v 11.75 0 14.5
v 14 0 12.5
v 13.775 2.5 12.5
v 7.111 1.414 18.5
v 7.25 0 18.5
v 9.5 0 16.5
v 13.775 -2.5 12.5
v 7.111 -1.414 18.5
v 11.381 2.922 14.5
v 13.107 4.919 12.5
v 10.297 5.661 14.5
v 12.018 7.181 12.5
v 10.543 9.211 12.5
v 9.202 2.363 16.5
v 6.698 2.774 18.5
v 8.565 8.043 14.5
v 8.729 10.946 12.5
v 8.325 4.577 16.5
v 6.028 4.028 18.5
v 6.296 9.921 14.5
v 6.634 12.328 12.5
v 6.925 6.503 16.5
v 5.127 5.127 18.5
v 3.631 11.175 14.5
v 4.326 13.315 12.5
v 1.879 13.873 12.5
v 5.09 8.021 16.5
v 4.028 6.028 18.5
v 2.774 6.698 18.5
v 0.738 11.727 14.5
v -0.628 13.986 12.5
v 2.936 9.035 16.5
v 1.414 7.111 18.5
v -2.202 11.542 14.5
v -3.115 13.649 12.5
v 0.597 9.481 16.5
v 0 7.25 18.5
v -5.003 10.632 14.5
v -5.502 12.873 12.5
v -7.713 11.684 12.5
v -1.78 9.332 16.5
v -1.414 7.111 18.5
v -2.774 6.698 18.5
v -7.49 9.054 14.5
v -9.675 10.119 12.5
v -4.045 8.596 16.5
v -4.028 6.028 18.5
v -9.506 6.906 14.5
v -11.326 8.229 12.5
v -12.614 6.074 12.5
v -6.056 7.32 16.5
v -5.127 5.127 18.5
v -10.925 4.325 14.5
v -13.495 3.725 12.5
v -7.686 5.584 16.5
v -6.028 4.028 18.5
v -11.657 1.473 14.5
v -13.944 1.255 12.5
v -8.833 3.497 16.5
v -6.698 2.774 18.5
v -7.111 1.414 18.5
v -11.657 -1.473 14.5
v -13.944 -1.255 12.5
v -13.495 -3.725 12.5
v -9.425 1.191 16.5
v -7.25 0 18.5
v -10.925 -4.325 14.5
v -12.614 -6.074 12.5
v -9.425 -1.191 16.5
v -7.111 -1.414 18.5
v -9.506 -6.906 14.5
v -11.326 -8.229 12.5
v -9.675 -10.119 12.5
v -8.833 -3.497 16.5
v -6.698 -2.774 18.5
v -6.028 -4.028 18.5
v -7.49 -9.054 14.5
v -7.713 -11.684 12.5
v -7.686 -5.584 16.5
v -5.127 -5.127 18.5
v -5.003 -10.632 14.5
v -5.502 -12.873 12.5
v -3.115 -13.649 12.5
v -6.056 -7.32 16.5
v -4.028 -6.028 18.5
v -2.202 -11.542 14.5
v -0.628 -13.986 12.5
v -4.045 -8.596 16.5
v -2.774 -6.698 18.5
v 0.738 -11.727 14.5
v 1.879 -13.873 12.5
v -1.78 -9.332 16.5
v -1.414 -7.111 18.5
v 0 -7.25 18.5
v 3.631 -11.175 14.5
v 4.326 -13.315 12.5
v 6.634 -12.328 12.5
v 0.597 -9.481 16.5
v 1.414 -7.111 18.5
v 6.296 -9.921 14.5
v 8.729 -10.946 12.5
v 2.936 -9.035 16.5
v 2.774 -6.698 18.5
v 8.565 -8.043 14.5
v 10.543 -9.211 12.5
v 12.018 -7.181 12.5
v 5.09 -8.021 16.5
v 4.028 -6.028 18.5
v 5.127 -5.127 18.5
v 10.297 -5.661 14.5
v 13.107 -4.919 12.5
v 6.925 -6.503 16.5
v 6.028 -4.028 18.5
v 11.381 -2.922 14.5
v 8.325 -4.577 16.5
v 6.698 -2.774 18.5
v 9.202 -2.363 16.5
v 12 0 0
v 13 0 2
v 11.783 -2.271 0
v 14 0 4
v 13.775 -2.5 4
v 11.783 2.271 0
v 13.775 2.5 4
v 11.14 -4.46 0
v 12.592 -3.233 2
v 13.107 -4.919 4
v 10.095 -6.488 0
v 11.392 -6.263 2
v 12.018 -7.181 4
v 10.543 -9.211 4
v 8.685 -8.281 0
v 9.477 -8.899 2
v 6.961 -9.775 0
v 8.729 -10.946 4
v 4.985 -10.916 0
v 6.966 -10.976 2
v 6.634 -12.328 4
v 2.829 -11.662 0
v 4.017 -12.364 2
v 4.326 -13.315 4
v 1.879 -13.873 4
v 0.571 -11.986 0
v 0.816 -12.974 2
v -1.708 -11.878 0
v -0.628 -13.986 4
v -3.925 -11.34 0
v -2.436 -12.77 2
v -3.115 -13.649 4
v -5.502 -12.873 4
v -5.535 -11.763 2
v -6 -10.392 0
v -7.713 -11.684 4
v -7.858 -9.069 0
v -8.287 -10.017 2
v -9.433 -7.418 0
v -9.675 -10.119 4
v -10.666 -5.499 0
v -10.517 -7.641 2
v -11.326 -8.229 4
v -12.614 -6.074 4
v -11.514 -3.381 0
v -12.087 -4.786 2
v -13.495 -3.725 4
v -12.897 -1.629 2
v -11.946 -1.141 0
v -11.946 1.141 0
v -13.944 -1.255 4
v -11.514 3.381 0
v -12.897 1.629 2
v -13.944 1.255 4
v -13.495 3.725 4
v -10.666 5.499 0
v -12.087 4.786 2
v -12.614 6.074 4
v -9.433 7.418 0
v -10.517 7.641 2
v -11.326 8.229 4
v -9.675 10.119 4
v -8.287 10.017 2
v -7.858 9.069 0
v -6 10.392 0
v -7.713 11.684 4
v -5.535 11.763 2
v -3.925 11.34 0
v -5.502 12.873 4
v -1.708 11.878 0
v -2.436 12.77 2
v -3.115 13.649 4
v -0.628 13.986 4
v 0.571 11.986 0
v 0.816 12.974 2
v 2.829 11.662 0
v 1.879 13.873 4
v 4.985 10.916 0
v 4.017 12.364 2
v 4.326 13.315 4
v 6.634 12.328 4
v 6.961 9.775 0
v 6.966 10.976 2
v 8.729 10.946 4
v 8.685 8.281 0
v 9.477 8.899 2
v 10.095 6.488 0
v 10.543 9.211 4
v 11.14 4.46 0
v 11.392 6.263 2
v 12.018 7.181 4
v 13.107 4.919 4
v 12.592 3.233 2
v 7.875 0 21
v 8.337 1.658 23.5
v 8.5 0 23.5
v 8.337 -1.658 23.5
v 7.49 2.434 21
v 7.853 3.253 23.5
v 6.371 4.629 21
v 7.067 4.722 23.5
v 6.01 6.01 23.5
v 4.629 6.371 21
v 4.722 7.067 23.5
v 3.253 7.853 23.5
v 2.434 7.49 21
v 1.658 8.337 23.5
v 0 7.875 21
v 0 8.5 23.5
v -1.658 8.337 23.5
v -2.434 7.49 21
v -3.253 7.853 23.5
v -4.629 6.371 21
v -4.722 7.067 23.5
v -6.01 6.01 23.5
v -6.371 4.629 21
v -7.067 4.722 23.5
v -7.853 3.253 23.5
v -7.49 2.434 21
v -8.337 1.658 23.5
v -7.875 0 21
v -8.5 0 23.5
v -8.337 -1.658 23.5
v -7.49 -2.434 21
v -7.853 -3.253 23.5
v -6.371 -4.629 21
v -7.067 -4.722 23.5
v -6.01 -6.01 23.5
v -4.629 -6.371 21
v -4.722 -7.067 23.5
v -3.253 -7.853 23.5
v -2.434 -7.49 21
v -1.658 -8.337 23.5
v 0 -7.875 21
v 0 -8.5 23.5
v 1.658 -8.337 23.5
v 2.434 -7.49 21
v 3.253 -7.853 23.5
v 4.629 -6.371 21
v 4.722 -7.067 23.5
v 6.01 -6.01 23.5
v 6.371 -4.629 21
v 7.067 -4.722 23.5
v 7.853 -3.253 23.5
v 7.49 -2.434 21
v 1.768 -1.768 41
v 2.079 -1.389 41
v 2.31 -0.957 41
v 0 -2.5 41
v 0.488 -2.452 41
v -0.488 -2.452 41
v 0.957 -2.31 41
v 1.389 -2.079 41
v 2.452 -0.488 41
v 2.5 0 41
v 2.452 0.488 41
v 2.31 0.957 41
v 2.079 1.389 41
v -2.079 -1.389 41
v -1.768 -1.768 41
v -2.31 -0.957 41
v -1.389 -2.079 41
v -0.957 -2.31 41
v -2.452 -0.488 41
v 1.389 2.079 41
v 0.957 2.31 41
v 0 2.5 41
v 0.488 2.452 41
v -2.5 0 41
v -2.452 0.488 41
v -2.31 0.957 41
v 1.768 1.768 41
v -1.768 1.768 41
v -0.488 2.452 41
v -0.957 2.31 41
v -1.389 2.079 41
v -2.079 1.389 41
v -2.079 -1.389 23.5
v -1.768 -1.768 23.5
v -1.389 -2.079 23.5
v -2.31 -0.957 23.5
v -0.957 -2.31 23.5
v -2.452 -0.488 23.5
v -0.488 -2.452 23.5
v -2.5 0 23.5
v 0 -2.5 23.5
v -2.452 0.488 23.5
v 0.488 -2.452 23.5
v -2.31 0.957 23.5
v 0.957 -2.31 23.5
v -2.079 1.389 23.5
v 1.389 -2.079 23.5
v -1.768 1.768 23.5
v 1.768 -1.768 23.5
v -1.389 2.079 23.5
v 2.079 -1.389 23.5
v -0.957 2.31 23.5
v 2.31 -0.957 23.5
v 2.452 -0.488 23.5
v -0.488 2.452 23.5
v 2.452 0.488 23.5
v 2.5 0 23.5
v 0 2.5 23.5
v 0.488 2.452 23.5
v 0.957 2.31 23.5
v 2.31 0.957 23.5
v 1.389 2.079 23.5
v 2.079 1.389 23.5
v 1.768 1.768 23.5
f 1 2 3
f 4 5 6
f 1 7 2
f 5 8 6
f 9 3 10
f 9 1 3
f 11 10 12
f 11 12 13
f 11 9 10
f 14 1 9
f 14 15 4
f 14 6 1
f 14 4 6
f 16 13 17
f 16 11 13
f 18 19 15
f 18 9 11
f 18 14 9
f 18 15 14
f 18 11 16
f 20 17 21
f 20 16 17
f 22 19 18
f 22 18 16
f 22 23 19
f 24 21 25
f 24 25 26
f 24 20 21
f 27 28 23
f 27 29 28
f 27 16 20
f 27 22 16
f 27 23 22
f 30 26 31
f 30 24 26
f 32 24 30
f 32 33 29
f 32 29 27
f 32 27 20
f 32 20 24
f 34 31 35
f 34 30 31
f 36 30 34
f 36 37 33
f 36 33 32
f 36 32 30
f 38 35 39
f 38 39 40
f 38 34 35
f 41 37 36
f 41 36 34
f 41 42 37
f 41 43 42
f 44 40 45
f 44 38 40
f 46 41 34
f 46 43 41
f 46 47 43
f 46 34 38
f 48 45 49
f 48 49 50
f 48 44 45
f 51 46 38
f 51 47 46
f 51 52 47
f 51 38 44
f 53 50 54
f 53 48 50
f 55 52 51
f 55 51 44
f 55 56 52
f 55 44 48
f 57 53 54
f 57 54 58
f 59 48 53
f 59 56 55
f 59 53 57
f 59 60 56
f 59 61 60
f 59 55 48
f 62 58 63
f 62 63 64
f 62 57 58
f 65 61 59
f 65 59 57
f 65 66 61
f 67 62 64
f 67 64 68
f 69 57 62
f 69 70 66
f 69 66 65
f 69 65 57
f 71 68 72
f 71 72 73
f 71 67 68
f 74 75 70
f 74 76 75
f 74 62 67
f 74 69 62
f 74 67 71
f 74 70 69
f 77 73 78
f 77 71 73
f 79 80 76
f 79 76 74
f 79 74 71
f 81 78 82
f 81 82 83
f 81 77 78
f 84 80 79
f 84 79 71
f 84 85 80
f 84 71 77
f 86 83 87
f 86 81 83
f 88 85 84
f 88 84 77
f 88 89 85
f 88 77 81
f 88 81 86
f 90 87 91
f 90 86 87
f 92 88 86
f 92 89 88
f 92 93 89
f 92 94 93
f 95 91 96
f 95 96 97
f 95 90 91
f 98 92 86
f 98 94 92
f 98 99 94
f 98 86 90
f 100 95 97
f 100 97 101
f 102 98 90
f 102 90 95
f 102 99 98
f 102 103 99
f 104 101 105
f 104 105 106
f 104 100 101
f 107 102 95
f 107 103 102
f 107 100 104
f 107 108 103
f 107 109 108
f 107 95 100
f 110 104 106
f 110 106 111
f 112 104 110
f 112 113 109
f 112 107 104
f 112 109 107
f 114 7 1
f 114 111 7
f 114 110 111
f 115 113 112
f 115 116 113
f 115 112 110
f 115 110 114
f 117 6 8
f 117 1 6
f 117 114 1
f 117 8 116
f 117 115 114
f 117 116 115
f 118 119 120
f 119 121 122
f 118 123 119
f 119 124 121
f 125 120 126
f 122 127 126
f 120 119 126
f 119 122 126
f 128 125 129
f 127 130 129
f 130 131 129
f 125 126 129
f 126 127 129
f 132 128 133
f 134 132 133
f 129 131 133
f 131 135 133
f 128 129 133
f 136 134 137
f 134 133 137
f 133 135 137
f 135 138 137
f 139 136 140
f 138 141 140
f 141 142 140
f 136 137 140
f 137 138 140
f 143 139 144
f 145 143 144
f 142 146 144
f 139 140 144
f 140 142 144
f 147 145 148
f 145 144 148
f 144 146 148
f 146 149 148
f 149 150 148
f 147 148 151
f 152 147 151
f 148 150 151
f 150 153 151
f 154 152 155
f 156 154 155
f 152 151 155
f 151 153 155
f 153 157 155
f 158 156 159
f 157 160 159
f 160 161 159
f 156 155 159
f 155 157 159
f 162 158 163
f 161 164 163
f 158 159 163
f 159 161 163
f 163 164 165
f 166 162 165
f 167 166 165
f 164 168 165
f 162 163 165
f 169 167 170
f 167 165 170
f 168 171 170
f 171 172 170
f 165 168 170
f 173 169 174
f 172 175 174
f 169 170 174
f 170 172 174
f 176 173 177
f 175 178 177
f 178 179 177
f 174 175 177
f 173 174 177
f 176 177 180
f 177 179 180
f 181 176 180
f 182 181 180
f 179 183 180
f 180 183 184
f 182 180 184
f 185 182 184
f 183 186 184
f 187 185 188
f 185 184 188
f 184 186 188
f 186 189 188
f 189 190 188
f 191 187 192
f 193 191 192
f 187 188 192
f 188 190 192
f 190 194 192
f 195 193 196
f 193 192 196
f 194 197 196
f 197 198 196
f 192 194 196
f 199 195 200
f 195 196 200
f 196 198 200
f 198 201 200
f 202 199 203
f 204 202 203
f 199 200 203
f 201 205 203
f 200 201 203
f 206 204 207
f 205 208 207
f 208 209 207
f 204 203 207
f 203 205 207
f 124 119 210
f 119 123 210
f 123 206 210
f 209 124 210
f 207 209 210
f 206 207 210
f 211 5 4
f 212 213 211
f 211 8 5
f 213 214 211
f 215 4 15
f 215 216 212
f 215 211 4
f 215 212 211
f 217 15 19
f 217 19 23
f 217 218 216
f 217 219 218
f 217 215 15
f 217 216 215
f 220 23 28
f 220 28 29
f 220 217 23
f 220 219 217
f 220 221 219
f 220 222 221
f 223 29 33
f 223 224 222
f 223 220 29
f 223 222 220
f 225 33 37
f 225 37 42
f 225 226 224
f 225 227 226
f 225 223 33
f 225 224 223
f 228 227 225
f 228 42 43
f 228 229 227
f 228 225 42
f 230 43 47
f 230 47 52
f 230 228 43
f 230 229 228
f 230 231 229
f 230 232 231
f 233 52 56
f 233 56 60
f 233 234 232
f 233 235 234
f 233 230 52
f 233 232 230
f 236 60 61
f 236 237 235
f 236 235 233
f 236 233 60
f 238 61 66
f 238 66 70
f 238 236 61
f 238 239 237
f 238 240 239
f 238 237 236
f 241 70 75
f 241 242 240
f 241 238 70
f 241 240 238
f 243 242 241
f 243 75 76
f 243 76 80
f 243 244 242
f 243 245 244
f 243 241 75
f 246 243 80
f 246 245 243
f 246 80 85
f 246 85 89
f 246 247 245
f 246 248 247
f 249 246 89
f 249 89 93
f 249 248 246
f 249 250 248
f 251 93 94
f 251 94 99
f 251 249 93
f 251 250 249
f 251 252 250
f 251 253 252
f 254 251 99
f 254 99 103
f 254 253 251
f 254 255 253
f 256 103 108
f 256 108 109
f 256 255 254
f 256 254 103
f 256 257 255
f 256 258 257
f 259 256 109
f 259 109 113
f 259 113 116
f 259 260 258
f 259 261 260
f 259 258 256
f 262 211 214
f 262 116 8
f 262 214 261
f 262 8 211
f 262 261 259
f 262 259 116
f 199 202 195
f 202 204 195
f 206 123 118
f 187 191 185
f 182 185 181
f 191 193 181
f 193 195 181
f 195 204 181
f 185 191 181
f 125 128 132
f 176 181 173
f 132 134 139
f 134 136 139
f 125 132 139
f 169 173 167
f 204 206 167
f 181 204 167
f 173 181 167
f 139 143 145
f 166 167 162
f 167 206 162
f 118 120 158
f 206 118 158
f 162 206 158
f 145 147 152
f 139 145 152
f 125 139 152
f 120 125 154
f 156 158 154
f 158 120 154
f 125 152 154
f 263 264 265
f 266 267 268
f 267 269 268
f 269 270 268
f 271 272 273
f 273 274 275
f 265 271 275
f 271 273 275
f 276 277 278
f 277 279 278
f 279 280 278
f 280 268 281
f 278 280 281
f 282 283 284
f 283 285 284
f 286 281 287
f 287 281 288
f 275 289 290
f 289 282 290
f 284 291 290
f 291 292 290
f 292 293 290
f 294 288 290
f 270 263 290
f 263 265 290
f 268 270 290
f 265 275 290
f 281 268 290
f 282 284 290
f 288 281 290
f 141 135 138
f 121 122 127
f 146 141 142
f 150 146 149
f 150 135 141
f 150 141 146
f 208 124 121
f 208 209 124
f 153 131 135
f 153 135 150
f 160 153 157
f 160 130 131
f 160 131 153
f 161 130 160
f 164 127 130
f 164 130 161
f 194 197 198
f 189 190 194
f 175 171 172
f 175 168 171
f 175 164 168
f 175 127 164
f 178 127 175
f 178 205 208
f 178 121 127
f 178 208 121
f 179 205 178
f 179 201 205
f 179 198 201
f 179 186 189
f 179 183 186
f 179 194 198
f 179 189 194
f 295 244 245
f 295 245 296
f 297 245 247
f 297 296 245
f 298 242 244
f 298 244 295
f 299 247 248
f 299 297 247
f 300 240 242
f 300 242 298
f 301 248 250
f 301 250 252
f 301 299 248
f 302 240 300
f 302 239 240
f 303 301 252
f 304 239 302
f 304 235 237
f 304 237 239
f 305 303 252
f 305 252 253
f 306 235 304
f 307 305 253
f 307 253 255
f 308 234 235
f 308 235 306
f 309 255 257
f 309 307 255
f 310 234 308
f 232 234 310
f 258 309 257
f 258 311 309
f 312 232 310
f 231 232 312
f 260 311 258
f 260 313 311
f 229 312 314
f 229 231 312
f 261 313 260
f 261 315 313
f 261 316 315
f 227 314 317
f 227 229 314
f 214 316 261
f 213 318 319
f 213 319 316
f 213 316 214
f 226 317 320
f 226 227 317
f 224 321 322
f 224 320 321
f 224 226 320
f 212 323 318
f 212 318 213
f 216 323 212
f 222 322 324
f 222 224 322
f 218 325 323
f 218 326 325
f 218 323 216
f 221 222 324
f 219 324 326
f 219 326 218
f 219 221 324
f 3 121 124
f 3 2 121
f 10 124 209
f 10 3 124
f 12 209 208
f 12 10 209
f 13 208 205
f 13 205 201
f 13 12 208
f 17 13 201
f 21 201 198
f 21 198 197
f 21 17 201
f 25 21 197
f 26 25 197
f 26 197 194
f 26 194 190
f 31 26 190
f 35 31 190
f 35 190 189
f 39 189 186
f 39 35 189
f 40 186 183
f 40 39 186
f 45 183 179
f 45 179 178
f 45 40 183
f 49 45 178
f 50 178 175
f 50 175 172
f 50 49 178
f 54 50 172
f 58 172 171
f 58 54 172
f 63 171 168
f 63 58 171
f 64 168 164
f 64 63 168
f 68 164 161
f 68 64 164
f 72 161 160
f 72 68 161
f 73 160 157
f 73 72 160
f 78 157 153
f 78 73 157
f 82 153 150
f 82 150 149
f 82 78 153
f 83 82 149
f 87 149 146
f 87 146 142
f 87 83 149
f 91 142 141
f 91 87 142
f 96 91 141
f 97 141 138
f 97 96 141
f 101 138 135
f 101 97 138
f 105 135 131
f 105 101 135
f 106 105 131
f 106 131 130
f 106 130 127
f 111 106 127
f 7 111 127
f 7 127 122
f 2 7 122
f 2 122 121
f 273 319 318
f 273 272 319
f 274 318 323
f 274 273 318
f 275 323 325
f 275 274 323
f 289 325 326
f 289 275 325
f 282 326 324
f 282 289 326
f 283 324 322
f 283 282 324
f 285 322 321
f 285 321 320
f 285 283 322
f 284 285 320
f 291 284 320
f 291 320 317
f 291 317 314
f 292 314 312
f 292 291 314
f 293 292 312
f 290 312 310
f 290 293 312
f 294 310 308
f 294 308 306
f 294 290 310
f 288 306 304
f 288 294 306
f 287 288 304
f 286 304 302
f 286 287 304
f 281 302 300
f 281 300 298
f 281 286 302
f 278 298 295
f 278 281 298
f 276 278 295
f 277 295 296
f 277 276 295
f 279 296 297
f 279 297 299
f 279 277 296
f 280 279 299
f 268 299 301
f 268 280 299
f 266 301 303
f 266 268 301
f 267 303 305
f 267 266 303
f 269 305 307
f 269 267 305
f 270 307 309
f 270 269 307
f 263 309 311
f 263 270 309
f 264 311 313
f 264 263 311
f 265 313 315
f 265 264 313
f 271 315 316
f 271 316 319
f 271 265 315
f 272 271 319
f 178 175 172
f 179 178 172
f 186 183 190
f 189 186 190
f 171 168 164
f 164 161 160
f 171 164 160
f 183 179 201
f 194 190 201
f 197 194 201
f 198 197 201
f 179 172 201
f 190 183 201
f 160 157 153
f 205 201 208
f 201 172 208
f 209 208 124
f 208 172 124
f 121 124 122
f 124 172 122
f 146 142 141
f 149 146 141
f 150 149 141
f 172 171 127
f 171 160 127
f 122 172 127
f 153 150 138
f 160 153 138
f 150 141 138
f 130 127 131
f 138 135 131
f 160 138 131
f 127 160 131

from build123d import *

# Parameters (mm, degrees)
F0_W   = 14
F0_H   = 8.5
F0_W_2 = 2.5
F0_H_2 = 17.5


with BuildPart() as f1:
    # F0 (on Front) → F1 (revolve)
    with BuildSketch(Plane.XZ):
        Polygon((0, 4), (0, 0), (12, 0), (14, 4), align=None)
    revolve(axis=Axis((0, 0, 2), (0, 0, -1)))


with BuildPart() as f2:
    # F0 (on Front) → F2 (revolve)
    with BuildSketch(Plane.XZ):
        with Locations((7, 8.25)):
            Rectangle(F0_W, F0_H)
        Polygon((0, 18.5), (0, 12.5), (14, 12.5), (7.25, 18.5), align=None)
        Polygon((0, 23.5), (0, 18.5), (7.25, 18.5), (8.5, 23.5), (2.5, 23.5), align=None)
        with Locations((1.25, 32.25)):
            Rectangle(F0_W_2, F0_H_2)
    revolve(axis=Axis((0, 0, 32.25), (0, 0, 1)))


solid = Compound([f1.part, f2.part])
